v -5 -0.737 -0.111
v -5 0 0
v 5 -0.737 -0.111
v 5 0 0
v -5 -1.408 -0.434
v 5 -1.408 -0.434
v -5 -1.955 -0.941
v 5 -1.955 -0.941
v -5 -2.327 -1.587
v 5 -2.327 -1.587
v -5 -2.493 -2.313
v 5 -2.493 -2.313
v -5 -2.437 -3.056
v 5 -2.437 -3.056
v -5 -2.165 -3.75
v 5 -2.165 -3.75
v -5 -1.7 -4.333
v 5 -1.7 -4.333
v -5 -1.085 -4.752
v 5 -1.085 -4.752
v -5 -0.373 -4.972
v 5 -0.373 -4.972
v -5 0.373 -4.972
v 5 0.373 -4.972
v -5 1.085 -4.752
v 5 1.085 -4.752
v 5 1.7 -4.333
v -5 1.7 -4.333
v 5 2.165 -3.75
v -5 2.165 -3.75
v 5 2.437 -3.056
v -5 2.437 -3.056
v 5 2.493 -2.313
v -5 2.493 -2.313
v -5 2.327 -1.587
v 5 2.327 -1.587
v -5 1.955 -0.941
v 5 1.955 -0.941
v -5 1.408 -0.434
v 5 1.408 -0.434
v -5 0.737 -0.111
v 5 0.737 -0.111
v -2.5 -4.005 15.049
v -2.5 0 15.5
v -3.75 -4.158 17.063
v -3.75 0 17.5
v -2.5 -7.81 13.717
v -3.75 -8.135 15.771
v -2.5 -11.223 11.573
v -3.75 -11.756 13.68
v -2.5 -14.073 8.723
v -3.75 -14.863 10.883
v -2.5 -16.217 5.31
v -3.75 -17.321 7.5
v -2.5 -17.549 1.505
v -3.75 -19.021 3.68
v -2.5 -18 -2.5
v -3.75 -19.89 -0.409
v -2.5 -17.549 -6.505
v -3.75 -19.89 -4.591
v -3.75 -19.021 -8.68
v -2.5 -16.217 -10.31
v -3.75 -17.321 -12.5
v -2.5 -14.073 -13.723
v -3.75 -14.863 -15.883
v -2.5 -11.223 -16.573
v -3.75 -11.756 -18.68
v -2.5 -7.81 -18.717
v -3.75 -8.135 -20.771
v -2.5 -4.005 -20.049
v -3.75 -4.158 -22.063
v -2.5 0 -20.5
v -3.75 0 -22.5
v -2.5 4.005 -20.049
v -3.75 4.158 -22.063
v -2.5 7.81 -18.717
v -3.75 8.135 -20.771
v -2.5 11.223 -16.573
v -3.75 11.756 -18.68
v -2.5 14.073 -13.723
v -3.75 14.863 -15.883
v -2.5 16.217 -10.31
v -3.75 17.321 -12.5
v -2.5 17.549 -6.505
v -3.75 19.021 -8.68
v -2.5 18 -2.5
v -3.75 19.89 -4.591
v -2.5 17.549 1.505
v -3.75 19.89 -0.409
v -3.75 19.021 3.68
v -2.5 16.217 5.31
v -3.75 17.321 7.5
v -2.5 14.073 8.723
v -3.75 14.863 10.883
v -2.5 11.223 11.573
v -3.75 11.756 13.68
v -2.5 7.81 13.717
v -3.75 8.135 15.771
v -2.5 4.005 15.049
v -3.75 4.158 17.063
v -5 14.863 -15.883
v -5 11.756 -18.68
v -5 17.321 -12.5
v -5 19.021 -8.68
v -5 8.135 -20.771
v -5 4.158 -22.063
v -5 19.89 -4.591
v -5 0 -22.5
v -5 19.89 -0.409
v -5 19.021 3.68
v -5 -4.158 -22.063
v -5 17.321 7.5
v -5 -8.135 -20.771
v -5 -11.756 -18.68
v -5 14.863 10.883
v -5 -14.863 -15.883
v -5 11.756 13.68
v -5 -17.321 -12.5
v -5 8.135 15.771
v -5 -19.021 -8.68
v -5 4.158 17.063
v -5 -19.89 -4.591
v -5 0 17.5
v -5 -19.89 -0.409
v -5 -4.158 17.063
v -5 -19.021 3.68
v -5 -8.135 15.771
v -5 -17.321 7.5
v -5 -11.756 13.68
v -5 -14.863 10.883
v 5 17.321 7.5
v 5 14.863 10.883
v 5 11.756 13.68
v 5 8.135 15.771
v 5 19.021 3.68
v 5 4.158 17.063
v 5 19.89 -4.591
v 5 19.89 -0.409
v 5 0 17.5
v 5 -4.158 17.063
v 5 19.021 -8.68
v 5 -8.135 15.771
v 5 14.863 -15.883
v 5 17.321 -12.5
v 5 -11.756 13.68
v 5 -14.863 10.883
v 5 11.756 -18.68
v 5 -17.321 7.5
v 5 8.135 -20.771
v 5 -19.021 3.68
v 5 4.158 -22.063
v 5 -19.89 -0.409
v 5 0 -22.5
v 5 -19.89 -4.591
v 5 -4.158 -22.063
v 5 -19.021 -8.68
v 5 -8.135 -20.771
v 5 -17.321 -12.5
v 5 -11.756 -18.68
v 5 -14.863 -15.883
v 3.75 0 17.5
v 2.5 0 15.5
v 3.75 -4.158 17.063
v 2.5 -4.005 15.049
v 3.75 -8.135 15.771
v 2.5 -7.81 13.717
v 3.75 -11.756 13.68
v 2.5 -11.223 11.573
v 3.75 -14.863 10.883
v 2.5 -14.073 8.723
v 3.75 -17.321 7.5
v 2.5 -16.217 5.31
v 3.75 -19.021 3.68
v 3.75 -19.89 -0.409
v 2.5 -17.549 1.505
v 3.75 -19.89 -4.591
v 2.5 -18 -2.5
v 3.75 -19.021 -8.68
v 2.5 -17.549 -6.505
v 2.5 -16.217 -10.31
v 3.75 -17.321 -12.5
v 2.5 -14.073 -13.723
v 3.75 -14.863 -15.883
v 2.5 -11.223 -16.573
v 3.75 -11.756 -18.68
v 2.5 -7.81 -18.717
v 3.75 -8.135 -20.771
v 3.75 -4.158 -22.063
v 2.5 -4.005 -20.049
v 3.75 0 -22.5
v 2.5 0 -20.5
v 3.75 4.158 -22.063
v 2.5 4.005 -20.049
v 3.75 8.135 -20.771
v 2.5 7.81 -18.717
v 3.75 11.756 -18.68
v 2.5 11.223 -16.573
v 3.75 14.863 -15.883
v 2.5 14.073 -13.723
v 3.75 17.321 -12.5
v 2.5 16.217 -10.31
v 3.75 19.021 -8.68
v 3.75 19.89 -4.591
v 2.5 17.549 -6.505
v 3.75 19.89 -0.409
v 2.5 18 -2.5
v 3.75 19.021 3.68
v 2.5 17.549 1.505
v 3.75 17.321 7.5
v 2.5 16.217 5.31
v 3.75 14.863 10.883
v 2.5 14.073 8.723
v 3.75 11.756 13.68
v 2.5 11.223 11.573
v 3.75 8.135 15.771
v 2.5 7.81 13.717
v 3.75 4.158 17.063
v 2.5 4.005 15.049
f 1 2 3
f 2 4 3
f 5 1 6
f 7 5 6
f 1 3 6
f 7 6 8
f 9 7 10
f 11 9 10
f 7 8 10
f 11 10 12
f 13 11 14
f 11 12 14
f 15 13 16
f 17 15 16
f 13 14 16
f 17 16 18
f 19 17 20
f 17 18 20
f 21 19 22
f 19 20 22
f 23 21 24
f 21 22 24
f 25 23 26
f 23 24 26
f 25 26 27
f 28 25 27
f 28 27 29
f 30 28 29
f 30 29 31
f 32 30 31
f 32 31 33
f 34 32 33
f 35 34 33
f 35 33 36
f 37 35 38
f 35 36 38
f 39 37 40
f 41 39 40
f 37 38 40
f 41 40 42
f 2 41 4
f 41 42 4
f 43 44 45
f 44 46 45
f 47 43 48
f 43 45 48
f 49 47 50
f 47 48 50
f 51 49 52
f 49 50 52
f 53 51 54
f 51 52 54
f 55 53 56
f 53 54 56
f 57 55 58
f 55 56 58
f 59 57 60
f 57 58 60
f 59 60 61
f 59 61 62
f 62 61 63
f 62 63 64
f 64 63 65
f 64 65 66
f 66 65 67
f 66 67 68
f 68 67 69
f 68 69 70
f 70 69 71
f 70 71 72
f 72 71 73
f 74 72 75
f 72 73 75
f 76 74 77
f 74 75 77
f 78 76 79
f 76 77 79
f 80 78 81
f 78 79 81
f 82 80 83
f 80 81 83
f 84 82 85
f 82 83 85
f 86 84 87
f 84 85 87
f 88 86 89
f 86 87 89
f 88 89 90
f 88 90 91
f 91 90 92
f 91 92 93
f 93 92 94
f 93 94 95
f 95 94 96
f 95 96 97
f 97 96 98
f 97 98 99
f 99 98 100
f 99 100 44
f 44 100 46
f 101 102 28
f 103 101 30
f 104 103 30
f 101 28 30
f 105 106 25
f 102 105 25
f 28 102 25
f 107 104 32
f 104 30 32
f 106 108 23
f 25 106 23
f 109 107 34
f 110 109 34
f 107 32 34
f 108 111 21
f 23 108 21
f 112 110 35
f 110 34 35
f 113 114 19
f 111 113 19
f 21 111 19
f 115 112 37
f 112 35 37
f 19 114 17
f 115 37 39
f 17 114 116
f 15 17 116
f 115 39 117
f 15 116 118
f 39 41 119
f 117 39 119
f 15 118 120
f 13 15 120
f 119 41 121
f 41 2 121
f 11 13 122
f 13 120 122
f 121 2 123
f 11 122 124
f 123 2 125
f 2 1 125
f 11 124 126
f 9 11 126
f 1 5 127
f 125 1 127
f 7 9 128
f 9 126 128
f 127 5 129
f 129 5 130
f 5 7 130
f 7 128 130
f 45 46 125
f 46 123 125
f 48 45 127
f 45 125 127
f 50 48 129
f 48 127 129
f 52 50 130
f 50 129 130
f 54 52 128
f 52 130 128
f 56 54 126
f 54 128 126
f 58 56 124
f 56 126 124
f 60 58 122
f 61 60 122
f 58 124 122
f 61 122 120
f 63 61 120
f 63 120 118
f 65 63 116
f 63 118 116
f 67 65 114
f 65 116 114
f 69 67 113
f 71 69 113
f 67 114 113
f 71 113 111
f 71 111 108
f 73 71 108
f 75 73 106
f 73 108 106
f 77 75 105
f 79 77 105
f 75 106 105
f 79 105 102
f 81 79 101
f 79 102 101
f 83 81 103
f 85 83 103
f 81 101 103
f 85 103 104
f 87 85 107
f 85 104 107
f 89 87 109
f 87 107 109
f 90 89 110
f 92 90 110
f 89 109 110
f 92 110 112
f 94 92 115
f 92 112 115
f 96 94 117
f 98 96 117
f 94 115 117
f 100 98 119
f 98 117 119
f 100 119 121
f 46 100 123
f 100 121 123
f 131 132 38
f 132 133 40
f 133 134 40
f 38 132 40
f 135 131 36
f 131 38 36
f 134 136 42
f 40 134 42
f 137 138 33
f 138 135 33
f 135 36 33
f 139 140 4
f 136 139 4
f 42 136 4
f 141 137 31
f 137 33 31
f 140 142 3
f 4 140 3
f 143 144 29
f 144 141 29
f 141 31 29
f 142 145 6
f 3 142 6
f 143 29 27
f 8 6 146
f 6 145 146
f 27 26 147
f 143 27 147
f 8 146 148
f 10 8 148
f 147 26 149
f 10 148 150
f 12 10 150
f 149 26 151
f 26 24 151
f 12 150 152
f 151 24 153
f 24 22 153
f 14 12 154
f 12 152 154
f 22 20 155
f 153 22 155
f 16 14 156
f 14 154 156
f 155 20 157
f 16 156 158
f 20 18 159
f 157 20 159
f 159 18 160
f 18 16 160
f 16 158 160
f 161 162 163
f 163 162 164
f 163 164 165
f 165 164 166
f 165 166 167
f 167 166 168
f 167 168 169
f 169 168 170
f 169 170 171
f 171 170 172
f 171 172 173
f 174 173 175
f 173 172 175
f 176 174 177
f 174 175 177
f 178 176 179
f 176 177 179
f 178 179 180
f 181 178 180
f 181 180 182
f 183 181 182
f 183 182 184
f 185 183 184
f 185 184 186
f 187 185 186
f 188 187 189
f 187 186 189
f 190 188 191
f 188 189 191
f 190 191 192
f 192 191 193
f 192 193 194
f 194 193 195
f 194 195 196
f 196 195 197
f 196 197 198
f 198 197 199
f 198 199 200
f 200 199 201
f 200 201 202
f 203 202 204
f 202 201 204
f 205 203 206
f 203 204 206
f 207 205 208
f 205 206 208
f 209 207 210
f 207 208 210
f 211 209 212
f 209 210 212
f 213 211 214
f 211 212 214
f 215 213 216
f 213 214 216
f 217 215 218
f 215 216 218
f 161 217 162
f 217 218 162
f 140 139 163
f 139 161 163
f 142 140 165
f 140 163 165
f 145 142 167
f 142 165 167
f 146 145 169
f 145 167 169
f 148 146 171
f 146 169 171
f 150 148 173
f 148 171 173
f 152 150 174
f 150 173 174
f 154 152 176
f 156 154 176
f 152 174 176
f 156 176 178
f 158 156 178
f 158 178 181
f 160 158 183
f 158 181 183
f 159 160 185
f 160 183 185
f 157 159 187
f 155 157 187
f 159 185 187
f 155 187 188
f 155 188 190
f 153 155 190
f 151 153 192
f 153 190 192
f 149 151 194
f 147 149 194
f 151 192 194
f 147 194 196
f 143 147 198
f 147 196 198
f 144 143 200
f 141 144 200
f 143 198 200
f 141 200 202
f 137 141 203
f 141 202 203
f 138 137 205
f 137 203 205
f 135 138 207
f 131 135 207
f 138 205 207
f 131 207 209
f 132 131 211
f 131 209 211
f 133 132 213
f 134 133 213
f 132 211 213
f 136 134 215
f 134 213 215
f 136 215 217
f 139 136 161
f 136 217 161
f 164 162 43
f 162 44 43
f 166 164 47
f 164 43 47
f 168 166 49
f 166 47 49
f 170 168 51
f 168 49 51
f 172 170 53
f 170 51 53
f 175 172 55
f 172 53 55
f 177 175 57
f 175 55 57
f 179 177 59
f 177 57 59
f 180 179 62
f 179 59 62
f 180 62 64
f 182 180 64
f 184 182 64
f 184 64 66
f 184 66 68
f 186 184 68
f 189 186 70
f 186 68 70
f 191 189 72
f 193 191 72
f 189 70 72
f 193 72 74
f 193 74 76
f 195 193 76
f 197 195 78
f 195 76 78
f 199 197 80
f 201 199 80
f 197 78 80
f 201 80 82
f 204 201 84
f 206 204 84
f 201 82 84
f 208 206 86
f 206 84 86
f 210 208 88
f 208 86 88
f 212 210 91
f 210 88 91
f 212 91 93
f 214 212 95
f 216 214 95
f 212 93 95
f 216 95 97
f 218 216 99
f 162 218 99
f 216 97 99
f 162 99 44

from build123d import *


with BuildPart() as f1:
    # F0 (on Front) → F1 (revolve)
    with BuildSketch(Plane.XZ):
        Polygon((-5, 5), (-5, 0), (5, 0), (5, 5), (2.5, 5), (-2.5, 5), align=None)
        Polygon((-5, 12.5), (-5, 5), (-2.5, 5), (2.5, 5), (5, 5), (5, 12.5), (2.5, 12.5), (-2.5, 12.5), align=None)
        Polygon((-5, 17.5), (-5, 12.5), (-2.5, 12.5), (2.5, 12.5), (5, 12.5), (5, 17.5), (3.75, 17.5), (2.5, 15.500004), (-2.5, 15.500004), (-3.75, 17.5), align=None)
    revolve(axis=Axis((0.313021, 0, -2.5), (1, 0, 0)))


solid = f1.part
